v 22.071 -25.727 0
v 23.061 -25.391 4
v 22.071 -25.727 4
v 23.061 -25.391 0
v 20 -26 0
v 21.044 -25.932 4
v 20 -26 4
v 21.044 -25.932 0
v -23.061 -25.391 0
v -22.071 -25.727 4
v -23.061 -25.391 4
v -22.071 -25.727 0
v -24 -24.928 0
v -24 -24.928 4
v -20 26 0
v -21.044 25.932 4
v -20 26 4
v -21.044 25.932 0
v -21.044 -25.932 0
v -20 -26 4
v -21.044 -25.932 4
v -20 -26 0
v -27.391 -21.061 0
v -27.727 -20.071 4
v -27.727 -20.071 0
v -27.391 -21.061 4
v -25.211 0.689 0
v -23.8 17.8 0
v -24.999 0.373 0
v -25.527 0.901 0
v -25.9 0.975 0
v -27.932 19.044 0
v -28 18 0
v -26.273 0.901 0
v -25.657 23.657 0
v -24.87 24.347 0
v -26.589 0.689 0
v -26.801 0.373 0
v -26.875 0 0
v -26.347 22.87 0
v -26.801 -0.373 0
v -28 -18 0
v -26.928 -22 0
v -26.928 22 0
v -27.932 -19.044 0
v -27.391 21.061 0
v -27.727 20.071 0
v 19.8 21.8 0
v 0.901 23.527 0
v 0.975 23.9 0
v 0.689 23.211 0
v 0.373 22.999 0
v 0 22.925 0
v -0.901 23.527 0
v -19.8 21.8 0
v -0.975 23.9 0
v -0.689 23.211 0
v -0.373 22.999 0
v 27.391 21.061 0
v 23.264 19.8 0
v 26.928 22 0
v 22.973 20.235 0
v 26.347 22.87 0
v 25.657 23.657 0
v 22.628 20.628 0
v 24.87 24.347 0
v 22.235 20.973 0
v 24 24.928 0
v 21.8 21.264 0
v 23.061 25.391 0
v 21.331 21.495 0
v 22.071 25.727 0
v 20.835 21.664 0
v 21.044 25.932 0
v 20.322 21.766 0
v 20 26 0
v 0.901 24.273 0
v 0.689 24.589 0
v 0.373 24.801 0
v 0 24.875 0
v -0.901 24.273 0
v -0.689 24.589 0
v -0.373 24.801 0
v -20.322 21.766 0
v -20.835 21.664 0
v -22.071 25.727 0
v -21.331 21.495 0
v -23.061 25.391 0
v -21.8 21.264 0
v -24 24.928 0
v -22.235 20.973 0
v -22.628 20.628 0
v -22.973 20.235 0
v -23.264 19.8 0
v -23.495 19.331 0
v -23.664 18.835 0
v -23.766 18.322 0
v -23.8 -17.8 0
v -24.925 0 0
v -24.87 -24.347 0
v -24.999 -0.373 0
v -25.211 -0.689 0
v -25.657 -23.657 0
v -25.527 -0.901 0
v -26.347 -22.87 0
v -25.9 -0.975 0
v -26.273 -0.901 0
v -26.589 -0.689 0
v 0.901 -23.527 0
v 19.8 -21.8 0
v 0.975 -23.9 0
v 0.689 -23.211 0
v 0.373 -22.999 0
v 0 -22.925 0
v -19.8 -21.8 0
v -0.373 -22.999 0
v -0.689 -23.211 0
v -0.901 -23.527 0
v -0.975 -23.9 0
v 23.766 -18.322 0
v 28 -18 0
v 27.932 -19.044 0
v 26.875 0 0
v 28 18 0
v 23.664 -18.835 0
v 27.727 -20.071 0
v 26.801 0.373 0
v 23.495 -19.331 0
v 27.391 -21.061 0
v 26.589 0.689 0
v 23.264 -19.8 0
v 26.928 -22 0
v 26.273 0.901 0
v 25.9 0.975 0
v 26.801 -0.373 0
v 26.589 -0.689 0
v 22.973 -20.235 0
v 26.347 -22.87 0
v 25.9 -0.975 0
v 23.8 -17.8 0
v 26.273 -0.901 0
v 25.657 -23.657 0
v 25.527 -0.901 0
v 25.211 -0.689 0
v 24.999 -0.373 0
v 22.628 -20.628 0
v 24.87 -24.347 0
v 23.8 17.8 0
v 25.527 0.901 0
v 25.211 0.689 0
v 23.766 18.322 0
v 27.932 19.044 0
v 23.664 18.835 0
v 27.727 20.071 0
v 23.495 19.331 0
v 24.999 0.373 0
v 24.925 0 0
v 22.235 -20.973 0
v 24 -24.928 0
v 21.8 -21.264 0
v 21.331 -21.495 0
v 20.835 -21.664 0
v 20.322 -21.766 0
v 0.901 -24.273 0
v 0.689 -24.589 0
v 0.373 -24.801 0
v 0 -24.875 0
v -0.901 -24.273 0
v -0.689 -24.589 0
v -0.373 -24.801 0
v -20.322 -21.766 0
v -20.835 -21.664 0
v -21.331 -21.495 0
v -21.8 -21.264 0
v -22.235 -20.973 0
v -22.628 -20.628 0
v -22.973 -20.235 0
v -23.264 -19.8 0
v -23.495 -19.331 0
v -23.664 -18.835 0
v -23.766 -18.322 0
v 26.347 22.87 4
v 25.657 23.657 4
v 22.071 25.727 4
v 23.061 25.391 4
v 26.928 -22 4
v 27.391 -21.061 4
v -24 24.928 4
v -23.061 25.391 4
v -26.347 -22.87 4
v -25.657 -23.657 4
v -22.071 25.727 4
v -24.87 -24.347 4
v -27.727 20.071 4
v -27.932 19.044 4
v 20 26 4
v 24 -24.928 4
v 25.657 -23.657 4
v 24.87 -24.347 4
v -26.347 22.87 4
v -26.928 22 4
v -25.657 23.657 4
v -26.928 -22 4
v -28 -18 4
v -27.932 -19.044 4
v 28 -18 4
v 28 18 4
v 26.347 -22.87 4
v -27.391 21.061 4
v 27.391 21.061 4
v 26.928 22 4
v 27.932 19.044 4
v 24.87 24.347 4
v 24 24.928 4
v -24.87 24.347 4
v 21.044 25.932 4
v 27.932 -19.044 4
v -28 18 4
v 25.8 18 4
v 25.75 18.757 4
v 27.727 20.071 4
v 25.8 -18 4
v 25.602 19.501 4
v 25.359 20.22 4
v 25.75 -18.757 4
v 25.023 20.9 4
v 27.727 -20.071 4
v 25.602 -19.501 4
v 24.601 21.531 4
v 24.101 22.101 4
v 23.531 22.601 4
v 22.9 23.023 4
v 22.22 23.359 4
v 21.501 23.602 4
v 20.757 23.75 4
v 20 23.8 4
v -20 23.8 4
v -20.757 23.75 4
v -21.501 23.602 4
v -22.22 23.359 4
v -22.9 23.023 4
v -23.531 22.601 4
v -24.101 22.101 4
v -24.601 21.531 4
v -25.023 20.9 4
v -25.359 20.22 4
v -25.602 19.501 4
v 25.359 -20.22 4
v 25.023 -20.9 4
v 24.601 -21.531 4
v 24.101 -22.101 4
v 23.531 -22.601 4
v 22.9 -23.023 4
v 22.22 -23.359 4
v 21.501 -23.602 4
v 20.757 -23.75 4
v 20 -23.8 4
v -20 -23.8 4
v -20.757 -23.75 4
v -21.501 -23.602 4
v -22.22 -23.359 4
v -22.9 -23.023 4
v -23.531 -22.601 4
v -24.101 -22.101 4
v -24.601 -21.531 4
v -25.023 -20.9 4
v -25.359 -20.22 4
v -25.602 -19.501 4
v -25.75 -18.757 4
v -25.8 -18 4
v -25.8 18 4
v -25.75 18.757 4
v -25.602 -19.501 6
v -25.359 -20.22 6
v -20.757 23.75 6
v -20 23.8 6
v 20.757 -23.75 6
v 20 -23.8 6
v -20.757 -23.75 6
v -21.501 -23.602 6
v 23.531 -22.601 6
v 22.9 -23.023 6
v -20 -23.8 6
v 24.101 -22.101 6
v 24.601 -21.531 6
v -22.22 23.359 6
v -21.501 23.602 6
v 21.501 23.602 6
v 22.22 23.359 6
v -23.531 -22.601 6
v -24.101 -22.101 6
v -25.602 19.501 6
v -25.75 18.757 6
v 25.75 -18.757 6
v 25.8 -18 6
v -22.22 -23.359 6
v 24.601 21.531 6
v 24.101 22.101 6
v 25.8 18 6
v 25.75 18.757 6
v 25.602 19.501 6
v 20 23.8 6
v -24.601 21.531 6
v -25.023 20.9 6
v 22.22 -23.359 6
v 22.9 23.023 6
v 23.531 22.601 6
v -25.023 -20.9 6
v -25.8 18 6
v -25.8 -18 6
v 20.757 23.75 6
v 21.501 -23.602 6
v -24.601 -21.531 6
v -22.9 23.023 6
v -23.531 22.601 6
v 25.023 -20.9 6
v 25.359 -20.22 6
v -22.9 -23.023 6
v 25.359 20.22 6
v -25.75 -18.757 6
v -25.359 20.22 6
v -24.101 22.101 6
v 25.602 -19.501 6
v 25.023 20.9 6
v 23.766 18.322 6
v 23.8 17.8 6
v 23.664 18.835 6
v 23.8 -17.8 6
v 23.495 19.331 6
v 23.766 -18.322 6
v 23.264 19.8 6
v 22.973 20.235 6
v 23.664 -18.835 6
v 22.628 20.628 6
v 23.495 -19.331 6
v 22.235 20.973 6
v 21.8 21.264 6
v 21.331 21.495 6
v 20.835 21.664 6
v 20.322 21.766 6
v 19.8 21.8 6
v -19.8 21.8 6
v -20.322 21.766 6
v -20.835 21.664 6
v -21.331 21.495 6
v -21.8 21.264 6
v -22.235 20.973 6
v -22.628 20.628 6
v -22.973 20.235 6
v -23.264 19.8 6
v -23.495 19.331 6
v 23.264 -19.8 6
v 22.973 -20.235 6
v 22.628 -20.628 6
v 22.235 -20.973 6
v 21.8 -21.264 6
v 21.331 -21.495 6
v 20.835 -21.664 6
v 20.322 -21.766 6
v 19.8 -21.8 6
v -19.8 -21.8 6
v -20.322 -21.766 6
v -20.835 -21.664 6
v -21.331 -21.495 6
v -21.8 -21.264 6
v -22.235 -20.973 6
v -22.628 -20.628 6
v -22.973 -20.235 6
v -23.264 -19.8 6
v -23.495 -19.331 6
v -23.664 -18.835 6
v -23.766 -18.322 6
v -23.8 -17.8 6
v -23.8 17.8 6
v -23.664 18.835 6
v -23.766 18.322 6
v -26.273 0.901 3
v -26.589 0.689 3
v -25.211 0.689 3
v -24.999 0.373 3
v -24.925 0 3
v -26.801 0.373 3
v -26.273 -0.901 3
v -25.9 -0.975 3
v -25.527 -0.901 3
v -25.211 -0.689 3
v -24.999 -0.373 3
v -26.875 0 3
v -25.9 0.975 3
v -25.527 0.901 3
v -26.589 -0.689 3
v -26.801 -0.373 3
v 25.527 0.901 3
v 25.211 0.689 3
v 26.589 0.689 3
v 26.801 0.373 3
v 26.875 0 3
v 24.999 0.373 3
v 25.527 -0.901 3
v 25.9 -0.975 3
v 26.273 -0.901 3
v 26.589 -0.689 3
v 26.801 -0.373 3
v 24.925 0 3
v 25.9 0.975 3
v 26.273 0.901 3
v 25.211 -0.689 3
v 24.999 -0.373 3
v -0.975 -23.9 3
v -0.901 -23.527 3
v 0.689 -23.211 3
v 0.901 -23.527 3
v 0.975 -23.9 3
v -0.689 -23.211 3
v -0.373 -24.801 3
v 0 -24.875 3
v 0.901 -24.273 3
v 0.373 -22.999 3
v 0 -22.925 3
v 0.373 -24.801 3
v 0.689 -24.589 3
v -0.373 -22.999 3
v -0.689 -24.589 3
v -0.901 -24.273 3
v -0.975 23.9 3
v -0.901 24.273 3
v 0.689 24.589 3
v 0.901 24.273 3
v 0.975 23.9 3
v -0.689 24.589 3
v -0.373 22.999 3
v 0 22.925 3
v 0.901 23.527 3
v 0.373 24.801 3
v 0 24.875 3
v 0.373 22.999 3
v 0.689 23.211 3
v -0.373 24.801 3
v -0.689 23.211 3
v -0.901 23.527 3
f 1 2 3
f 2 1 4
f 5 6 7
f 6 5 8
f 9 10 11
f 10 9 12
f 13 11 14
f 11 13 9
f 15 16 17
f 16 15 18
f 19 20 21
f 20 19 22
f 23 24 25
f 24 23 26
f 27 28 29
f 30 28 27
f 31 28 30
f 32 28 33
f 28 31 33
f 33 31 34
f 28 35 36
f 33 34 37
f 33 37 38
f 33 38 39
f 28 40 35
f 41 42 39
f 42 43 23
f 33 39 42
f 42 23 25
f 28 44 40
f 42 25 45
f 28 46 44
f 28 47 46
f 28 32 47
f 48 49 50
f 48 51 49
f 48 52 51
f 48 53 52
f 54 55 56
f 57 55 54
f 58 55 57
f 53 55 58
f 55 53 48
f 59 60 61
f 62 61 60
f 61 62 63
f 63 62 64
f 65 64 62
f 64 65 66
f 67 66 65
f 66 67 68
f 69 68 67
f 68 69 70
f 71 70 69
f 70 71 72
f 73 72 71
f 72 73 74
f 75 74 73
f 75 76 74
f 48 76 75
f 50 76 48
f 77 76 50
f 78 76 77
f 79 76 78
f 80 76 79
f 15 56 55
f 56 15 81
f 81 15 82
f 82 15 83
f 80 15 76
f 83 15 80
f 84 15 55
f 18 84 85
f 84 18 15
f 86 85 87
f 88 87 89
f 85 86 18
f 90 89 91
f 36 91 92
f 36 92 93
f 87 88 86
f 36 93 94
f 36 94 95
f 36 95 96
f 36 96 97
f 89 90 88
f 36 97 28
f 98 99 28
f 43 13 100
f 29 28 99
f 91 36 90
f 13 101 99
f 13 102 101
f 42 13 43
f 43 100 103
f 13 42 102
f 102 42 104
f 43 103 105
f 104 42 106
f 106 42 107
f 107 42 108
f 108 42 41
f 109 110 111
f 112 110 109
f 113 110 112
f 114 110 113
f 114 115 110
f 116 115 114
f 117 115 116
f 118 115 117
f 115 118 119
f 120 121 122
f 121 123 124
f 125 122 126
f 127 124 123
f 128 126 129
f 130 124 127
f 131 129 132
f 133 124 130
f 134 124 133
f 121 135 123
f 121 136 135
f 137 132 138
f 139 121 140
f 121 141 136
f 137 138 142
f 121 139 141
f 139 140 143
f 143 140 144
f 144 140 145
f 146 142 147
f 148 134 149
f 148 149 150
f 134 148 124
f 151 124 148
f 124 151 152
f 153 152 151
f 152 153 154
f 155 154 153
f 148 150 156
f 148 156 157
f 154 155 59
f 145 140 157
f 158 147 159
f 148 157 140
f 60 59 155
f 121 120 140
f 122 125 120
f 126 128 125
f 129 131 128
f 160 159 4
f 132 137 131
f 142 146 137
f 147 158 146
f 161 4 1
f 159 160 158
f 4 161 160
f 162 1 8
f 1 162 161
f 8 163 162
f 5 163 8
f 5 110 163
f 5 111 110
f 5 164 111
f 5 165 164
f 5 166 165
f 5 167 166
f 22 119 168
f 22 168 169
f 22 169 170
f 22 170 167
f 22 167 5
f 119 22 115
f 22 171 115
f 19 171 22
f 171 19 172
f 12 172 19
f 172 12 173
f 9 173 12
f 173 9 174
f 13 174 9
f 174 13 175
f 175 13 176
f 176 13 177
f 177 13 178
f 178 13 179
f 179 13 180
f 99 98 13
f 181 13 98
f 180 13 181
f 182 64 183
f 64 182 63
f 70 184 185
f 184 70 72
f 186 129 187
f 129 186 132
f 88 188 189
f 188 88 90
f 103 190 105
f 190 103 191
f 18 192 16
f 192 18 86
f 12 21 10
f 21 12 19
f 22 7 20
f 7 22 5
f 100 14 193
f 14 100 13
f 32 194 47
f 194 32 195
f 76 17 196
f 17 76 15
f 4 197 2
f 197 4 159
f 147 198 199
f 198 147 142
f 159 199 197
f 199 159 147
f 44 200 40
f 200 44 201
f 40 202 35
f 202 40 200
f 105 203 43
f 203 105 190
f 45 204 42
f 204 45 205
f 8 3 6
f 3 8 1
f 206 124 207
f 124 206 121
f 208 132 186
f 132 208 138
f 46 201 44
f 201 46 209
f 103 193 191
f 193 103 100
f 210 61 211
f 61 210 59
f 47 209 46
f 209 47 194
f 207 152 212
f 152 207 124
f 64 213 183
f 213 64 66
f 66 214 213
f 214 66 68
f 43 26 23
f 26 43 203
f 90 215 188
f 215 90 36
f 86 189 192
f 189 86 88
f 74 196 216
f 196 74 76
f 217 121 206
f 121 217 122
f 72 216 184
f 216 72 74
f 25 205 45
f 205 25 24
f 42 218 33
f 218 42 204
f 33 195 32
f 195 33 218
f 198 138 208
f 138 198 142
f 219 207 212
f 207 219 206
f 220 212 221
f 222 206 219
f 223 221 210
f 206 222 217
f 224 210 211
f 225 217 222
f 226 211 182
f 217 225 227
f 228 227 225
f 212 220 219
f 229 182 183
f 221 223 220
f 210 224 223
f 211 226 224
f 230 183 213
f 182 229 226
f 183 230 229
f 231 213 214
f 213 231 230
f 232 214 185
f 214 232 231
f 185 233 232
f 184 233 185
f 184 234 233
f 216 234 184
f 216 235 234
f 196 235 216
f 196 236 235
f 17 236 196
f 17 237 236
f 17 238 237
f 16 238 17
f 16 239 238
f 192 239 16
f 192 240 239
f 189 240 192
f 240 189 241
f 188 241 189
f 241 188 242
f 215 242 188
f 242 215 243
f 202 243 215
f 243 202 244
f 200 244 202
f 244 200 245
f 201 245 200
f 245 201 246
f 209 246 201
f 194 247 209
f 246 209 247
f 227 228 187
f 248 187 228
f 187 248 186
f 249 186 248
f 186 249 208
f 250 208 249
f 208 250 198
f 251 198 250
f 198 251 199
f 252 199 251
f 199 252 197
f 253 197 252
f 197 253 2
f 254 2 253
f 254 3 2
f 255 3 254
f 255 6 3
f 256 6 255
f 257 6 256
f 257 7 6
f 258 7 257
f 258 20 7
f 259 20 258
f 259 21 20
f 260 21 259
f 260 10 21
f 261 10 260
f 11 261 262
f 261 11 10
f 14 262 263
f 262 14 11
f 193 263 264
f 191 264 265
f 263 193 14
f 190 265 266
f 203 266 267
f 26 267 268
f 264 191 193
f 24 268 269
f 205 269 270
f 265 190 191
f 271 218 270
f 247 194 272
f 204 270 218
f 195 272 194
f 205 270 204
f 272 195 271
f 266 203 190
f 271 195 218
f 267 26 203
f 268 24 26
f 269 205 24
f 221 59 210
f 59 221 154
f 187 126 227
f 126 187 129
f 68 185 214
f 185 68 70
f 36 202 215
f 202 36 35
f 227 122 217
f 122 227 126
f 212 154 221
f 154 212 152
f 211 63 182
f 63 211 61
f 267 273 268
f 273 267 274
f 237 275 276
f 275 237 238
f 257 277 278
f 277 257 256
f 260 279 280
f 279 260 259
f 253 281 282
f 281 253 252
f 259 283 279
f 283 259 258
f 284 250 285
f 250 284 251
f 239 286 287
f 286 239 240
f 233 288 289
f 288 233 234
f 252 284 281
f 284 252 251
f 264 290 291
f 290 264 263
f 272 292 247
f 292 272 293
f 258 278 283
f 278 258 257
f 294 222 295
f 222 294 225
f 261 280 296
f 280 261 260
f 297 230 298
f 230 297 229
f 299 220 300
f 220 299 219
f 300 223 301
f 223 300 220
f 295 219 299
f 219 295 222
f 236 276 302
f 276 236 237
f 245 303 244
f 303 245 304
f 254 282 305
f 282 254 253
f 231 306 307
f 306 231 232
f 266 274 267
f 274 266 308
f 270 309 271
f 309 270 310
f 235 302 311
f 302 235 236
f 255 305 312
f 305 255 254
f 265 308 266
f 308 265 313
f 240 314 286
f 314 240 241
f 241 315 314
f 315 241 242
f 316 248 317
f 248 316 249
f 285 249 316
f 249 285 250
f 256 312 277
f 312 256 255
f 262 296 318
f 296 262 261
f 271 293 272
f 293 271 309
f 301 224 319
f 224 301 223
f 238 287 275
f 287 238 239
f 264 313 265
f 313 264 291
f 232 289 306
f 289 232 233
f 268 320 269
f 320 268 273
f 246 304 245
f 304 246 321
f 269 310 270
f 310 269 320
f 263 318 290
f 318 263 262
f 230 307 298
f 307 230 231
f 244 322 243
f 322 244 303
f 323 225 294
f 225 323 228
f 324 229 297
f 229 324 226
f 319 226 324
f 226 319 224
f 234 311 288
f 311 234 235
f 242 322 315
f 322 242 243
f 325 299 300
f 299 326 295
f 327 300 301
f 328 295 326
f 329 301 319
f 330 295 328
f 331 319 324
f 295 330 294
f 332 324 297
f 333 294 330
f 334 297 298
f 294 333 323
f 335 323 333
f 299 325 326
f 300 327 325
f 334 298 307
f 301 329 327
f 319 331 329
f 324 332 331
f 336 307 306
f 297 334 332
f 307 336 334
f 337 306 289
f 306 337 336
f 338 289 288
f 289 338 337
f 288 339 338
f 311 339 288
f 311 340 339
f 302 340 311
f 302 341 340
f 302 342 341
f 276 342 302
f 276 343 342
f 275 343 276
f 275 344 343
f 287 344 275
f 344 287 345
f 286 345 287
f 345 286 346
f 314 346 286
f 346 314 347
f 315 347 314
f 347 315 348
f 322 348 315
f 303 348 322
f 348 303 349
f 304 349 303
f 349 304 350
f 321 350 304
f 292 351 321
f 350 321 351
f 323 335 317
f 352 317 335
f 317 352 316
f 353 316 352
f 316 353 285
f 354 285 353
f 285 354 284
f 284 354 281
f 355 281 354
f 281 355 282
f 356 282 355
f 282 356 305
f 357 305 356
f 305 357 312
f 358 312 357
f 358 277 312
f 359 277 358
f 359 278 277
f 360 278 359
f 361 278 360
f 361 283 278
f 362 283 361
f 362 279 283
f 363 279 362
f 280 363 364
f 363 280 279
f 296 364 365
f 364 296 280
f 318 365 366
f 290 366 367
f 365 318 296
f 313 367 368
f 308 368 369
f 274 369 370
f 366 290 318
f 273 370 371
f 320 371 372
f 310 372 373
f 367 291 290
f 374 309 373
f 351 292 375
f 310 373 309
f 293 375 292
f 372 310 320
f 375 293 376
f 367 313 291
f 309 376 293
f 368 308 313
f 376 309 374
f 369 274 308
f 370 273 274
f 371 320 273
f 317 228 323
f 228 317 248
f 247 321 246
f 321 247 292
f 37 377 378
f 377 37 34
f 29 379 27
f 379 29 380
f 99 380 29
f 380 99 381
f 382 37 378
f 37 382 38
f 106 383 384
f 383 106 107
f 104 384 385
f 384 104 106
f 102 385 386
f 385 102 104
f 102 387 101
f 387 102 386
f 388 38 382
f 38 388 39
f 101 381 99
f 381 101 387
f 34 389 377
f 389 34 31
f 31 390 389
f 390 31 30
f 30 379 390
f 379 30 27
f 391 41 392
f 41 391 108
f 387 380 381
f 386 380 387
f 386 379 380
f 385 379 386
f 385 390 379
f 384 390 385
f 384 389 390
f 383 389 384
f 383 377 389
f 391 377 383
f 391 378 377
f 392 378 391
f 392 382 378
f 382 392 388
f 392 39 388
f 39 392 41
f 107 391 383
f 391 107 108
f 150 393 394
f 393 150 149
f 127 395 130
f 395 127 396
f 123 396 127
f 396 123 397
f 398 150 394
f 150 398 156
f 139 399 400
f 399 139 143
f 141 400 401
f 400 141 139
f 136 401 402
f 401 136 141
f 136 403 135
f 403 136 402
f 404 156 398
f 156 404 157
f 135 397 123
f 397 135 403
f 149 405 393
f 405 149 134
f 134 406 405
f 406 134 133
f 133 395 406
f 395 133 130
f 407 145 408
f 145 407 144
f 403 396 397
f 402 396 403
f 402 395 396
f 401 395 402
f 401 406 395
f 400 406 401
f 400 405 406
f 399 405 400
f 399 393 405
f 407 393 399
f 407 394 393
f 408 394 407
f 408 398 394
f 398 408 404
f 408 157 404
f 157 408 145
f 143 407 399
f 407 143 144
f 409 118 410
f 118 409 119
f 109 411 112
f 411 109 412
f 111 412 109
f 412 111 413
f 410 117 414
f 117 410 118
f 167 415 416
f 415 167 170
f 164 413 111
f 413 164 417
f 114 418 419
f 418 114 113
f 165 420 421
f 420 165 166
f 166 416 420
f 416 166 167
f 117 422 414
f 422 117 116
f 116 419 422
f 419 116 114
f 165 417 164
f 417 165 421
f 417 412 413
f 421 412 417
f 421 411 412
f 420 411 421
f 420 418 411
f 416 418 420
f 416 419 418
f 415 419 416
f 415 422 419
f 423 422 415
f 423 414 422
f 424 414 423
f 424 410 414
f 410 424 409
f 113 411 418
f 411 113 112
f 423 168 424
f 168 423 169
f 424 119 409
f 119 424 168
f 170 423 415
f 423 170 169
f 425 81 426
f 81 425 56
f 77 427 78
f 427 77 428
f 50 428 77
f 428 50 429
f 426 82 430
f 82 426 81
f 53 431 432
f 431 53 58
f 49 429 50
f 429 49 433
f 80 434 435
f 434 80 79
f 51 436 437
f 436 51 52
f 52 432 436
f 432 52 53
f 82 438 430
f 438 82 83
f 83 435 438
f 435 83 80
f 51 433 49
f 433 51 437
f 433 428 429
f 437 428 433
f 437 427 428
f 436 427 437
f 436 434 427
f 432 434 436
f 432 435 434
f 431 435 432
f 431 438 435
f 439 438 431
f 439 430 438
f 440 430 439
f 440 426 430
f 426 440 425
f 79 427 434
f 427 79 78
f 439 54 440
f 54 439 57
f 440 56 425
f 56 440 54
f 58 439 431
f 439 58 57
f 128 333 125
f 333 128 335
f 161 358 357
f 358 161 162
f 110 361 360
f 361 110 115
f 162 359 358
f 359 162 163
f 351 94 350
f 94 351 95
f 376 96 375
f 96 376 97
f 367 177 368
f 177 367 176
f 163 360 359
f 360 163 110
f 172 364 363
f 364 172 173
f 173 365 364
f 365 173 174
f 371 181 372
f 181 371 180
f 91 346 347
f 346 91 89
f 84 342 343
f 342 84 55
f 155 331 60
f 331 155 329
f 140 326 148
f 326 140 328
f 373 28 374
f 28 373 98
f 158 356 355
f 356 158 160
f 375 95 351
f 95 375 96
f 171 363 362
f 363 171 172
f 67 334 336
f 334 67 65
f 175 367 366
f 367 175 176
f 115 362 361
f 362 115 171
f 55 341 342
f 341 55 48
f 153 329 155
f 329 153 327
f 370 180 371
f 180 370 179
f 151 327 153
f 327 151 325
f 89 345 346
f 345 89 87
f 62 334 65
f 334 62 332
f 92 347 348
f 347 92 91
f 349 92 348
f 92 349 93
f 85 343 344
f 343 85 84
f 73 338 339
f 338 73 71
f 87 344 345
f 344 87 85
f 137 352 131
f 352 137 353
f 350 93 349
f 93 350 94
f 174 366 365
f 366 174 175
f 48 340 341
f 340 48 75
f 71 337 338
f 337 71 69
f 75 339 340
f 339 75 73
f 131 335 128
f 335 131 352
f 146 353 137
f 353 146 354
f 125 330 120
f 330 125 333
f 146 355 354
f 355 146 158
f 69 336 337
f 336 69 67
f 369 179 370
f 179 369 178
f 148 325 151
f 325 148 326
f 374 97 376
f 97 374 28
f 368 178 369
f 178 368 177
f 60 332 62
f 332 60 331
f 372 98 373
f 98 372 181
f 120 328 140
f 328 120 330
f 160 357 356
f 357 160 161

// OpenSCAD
// file: ../config.scad
// Sparky - shared parameters and the module interface spec.
// All dimensions in mm. Origin: centre of the footprint, on the table.
// +X = right, +Y = back, -Y = front (screen side), +Z = up.
//
// Values marked (measure) are estimates; measure your parts and edit here.

$fn = 48;

// ---------- Interface (keep fixed so modules stay swappable) ----------
outer_w   = 56;     // footprint width
outer_d   = 52;     // footprint depth
corner_r  = 8;      // vertical corner radius of shell, collar and base
wall      = 2;      // shell wall
clear     = 0.3;    // fit clearance between printed parts

base_h    = 12;     // battery base height (deck top)
deck_t    = 2;      // base deck thickness
collar_h  = 4;      // interface collar band
ridge_h   = 2;      // locating ridge on top of the collar
shell_z0  = base_h + collar_h;  // 16, bottom of the shell
shell_z1  = 70;     // top of the shell

// Magnets: 6 x 3 mm neodymium discs, all N faces pointing up.
mag_d     = 6.2;    // pocket diameter (magnet 6.0)
mag_h     = 3.2;    // pocket depth (magnet 3.0)
boss_d    = 9;

mag_base_rack  = [[-21,-14],[21,-14],[-21,16],[21,16]];   // base deck <-> rack floor
mag_rack_shell = [[-18,-15],[18,-15],[-18,17],[18,17]];   // rack crown <-> shell ceiling
mag_lid        = [[-21,-19],[21,-19],[-21,19],[21,19]];   // lid <-> base
collar_pins    = [[-25.9,0],[25.9,0],[0,-23.9],[0,23.9]];
pin_hole  = 1.95;   // locating pins: short pieces of 1.75 mm filament
pin_depth = 3;

// ---------- Inner rack ----------
rack_z0   = base_h;  // 12, sits on the base deck
rack_w    = 47.2;
rack_d    = 43.2;
rack_t    = 3;       // structural wall thickness (PLA: keep >= 3)
crown_z   = 62;      // crown plate bottom (top = 65)
shelf_z   = 21;      // ESP32 shelf bottom (top = 24)

// ---------- Components (measure) ----------
oled_hole_dx = 30.4;           // 1.3" OLED mounting holes, centre to centre
oled_hole_dz = 28.4;
oled_hole_z  = 45;             // centre height of the OLED
m2_pilot     = 1.8;            // pilot hole for M2 self-tapping screws

screen_w  = 34;  screen_h = 24;  screen_z = 34;   // window in the shell
led_z     = 20;  led_d    = 5.2;
mic_y     = -7;  mic_hole = 1.2;
usb_w     = 12;  usb_h    = 7;   usb_z    = 33;
sw_x      = 13.5; sw_w    = 8;   sw_h     = 4;   sw_z = 30;
spk_slots = 5;   spk_y0   = -9;  spk_pitch = 3.5; spk_slot_w = 1.6;
spk_z0    = 24;  spk_z1   = 56;

battery   = [30, 40, 5];       // LiPo 503040 (measure)
lid_t     = 4;

// ---------- Helpers ----------
module rrect2d(w, d, r) { offset(r) square([w - 2*r, d - 2*r], center = true); }
module rrect(w, d, r, h) { linear_extrude(h) rrect2d(w, d, r); }
module rbox(w, d, h, r) {      // box with every edge rounded, z from 0 to h
  hull() for (x = [-1,1], y = [-1,1], z = [r, h - r])
    translate([x*(w/2 - r), y*(d/2 - r), z]) sphere(r);
}
module mag_pocket(z) { translate([0,0,z]) cylinder(d = mag_d, h = mag_h); }
// main file
// Interface collar: the separate "lip" between battery base and shell.
// Located by 4 filament pins in the base, clamped by the shell. No fasteners.
include <../config.scad>

module collar() {
  hole_w = rack_w + 2*0.2;   // rack floor passes through
  hole_d = rack_d + 2*0.2;
  difference() {
    union() {
      rrect(outer_w, outer_d, corner_r, collar_h);
      translate([0, 0, collar_h])
        rrect(outer_w - 2*wall - 2*0.2, outer_d - 2*wall - 2*0.2, corner_r - wall - 0.2, ridge_h);
    }
    translate([0, 0, -1]) rrect(hole_w, hole_d, 4, collar_h + ridge_h + 2);
    for (p = collar_pins) translate([p[0], p[1], -1]) cylinder(d = pin_hole, h = pin_depth + 1, $fn = 16);
  }
}

collar();
